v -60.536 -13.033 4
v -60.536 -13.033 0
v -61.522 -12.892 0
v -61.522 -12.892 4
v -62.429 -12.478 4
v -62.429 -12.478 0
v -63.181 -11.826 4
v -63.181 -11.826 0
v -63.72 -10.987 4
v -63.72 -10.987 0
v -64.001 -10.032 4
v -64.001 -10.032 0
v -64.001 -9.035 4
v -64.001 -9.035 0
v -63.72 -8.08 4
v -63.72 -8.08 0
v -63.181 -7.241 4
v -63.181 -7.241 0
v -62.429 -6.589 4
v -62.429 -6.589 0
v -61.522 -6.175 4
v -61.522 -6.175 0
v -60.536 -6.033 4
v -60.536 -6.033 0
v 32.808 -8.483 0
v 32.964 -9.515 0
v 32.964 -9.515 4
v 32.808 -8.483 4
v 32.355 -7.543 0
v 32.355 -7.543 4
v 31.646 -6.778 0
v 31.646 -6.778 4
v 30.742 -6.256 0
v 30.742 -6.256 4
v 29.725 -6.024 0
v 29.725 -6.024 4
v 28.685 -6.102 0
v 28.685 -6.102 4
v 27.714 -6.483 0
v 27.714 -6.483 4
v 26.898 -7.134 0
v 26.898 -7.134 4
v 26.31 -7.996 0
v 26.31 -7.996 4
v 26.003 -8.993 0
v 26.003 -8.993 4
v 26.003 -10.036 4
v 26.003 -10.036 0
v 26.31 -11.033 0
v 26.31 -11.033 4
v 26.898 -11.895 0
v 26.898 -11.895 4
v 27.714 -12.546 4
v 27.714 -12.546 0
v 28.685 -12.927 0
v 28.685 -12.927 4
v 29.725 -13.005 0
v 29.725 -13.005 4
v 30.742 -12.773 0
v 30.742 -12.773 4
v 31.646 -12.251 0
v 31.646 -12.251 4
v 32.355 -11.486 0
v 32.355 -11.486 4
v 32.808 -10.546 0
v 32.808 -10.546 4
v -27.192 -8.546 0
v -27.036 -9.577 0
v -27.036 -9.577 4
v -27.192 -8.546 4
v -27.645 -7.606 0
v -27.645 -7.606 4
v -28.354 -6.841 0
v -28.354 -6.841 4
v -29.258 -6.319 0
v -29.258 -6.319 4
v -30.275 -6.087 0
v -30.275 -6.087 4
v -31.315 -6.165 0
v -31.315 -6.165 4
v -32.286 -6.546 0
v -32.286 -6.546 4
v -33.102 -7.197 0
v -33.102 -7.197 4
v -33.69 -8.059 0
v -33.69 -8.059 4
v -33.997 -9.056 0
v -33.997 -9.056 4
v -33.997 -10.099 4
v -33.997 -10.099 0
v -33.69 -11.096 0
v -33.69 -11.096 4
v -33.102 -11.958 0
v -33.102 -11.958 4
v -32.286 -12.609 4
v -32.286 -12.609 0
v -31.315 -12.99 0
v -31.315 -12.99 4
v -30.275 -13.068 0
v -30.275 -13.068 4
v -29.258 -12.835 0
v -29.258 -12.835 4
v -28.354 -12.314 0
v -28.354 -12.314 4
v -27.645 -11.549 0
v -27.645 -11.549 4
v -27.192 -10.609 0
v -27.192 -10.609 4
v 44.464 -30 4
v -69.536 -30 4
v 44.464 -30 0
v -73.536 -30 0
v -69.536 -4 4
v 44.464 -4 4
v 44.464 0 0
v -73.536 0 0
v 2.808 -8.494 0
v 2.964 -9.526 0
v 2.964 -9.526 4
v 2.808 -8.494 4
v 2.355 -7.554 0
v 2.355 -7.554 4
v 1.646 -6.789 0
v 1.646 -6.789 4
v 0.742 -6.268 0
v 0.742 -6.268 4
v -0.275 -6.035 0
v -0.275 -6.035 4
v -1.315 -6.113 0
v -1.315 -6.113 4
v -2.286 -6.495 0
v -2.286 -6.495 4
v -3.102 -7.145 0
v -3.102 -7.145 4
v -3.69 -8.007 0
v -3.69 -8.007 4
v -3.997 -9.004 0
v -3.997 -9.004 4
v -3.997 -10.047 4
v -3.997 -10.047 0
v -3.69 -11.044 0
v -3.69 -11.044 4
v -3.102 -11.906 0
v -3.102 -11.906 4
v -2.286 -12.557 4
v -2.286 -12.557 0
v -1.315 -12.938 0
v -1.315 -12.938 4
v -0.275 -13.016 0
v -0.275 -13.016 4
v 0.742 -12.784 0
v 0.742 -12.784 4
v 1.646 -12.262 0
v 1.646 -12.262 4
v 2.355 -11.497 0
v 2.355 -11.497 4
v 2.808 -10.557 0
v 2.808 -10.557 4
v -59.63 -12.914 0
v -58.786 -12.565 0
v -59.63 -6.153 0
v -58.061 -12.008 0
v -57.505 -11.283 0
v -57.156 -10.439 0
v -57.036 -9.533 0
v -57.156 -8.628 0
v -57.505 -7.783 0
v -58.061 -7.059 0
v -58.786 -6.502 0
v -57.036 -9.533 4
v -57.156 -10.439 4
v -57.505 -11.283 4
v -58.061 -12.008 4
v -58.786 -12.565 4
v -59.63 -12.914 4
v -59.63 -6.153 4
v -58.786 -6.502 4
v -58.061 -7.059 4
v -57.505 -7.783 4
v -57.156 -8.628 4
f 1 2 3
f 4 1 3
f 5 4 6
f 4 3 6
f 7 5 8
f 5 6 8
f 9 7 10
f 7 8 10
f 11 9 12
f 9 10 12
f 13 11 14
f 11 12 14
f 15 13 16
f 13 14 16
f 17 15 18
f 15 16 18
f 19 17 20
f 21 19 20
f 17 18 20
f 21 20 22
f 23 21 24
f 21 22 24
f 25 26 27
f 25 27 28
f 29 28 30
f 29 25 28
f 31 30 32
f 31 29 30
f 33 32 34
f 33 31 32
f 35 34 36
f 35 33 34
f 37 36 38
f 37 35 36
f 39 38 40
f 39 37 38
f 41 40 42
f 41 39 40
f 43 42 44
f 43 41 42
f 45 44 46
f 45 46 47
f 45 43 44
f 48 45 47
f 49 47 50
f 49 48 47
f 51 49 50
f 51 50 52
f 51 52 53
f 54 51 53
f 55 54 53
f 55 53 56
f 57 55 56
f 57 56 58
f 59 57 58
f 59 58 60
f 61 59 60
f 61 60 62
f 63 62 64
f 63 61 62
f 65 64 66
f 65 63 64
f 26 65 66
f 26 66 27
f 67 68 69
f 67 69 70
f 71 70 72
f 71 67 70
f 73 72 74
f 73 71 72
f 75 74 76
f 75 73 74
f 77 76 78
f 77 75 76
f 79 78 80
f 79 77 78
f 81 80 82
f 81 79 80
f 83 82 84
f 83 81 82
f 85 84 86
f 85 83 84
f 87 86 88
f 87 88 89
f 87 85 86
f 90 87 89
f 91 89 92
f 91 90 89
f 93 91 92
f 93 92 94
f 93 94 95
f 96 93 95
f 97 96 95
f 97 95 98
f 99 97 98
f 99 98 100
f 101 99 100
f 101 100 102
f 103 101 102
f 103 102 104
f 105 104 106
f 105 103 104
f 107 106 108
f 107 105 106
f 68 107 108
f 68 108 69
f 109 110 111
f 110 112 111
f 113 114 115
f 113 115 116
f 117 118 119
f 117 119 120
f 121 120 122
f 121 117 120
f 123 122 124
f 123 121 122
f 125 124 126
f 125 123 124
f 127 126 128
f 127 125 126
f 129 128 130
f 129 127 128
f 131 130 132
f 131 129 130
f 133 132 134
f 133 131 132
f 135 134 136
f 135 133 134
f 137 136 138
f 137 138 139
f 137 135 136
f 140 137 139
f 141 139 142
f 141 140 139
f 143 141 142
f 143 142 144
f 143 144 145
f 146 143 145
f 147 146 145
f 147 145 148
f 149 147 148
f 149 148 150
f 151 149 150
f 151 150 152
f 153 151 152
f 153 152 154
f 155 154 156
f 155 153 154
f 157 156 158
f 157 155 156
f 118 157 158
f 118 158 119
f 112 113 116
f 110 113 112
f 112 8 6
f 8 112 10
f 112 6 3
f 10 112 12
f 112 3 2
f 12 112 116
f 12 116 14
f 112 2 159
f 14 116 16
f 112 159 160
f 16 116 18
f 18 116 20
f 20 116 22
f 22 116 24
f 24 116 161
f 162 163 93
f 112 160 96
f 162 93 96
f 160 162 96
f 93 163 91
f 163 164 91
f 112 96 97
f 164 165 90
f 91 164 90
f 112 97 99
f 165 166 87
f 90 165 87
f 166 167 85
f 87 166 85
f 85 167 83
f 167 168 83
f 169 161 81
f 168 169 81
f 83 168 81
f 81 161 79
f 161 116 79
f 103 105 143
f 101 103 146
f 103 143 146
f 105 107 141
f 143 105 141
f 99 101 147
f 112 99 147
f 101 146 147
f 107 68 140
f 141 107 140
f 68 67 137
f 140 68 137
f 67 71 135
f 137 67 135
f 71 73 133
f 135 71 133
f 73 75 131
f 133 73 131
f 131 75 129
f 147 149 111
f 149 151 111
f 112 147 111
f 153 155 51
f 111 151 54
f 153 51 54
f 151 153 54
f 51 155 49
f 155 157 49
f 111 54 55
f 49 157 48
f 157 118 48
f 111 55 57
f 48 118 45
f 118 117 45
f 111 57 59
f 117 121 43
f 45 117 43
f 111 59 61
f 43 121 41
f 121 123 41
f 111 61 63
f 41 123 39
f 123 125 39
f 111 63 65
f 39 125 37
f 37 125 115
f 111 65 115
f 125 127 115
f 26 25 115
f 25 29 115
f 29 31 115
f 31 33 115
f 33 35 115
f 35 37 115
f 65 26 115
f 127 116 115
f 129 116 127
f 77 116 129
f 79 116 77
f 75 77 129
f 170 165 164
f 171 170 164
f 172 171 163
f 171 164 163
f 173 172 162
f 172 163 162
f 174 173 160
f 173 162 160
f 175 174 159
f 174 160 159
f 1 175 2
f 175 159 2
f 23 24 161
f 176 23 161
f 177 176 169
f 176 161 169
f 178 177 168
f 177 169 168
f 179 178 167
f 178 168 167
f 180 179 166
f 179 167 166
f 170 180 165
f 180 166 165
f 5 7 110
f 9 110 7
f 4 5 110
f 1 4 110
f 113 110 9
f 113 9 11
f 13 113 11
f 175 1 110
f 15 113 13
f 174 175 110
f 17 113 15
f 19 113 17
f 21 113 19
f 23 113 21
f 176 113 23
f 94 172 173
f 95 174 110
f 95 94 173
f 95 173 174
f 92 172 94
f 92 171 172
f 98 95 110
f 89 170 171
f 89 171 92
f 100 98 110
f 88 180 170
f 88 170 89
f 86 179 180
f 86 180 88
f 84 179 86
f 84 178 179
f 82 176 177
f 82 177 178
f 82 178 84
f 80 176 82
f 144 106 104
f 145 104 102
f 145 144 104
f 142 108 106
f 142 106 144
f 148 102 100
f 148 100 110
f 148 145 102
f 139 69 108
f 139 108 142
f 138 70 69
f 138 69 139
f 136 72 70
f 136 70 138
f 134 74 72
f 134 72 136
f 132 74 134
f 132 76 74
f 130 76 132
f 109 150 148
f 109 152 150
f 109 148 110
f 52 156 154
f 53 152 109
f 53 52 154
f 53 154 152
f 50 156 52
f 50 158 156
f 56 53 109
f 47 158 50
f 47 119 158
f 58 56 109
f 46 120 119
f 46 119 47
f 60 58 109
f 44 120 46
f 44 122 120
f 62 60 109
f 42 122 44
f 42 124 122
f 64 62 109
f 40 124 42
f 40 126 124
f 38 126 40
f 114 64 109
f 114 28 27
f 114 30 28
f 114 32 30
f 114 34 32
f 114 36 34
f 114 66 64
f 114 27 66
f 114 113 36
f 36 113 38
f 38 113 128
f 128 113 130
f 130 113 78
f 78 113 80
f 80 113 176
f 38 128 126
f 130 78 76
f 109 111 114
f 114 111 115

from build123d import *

# Parameters (mm, degrees)
F0_R     = 3.5
F1_DEPTH = 4
F2_SIZE  = 3.99999


# Not quite as in the source:
# - a fillet or chamfer is up to 0.001 mm smaller than in the source, because OpenCascade refuses the exact size


with BuildPart() as f1:
    # F0 (on Top) → F1 (new body)
    with BuildSketch(Plane.XY):
        with BuildLine():
            Line((-60.536339879, 0), (-73.536339879, 0))
            Line((-73.536339879, 0), (-73.536339879, -4))
            Line((-73.536339879, -4), (-73.536339879, -30))
            Line((-73.536339879, -30), (-60.536339879, -30))
            Line((-60.536339879, -30), (-60.536339879, -13.0334984362))
            ThreePointArc((-60.536339879, -13.0334984362), (-64.036339879, -9.5334984362), (-60.536339879, -6.0334984362))
            Line((-60.536339879, -6.0334984362), (-60.536339879, 0))
        make_face()
        with BuildLine():
            Line((44.463660121, 0), (-60.536339879, 0))
            Line((-60.536339879, 0), (-60.536339879, -6.0334984362))
            ThreePointArc((-60.536339879, -6.0334984362), (-58.0614661449, -7.0586247021), (-57.036339879, -9.5334984362))
            ThreePointArc((-57.036339879, -9.5334984362), (-58.0614661449, -12.0083721704), (-60.536339879, -13.0334984362))
            Line((-60.536339879, -13.0334984362), (-60.536339879, -30))
            Line((-60.536339879, -30), (-52.7029968798, -30))
            Line((-52.7029968798, -30), (44.463660121, -30))
            Line((44.463660121, -30), (44.463660121, 0))
        make_face()
        with Locations((-30.536339879, -9.5774214715)):
            Circle(F0_R, mode=Mode.SUBTRACT)
        with Locations((-0.536339879, -9.52560734)):
            Circle(F0_R, mode=Mode.SUBTRACT)
        with Locations((29.463660121, -9.5145422965)):
            Circle(F0_R, mode=Mode.SUBTRACT)
    extrude(amount=F1_DEPTH)

    # F2 (size 4 in the source; OpenCascade refuses exactly that, so slightly less here)
    f2_edges = [f1.edges().sort_by_distance(p)[0] for p in [
        (-73.53634, -15, 4),
        (-14.53634, 0, 4),
    ]]
    chamfer(f2_edges, length=F2_SIZE)


solid = f1.part
